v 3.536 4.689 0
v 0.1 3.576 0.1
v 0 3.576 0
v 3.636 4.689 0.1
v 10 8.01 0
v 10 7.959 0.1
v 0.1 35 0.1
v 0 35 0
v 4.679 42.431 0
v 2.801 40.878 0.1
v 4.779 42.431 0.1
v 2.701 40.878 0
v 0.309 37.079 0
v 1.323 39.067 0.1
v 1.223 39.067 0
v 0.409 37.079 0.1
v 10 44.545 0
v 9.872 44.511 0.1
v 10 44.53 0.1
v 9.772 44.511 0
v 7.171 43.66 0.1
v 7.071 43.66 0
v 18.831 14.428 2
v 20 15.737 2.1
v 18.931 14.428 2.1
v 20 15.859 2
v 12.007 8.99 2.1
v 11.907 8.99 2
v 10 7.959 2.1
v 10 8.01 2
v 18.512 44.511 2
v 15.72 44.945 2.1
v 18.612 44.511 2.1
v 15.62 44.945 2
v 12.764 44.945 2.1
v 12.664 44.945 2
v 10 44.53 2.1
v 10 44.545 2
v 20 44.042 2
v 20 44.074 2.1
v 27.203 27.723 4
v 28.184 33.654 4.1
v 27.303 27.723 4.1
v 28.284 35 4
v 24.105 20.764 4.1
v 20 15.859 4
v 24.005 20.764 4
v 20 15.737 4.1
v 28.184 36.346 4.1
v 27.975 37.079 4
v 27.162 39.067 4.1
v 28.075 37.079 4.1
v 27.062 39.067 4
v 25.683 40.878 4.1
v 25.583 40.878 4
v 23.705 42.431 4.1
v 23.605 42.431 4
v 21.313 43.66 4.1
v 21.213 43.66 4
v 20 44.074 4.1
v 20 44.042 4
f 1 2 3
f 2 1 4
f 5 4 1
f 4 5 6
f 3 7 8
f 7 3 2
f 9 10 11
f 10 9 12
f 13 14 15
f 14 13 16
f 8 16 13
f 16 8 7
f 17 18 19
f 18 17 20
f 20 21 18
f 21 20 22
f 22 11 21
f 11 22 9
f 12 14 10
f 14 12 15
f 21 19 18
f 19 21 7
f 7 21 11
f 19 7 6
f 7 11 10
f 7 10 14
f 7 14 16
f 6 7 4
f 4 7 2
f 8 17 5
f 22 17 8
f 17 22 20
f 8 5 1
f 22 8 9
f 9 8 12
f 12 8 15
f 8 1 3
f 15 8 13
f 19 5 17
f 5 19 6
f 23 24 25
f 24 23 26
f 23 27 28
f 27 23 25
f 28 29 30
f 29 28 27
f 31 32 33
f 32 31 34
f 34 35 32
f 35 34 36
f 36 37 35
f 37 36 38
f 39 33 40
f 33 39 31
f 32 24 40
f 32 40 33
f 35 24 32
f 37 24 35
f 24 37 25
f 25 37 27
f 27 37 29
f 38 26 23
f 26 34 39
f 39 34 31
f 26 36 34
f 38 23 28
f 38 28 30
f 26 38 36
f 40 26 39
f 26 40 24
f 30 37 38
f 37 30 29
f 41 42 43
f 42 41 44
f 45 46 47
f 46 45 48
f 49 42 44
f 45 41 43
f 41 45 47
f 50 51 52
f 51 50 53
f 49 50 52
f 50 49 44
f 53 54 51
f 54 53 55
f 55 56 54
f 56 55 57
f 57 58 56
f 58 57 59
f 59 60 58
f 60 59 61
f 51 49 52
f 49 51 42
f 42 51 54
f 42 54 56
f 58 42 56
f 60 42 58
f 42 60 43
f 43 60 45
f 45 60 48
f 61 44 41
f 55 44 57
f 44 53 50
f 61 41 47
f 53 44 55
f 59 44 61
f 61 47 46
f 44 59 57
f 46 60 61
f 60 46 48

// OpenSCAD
module hcore () translate([0,35,0]) rotate([0,45,0]) {
    intersection() {
        union() {
            translate([10,0,0]) cylinder(20,10,10);
            intersection() {
                translate([-15,0,0]) cylinder(20,35, 35);
                translate([0,-70,0]) cube([40,70,20]);
            };
        }
        rotate([0,-45,0]) translate([0,-35,0]) cube([40,50,0.1]);
    }
}

module core1 () intersection() {
    hcore();
    cube([10,50,20]);
}

module core2 () intersection() {
    hcore();
    translate([10,0,0]) cube([10,50,20]);
}

module core3 () intersection() {
    hcore();
    translate([20,0,0]) cube([10,50,20]);
}
core1();
translate([0,0,2]) core2();
translate([0,0,4]) core3();
